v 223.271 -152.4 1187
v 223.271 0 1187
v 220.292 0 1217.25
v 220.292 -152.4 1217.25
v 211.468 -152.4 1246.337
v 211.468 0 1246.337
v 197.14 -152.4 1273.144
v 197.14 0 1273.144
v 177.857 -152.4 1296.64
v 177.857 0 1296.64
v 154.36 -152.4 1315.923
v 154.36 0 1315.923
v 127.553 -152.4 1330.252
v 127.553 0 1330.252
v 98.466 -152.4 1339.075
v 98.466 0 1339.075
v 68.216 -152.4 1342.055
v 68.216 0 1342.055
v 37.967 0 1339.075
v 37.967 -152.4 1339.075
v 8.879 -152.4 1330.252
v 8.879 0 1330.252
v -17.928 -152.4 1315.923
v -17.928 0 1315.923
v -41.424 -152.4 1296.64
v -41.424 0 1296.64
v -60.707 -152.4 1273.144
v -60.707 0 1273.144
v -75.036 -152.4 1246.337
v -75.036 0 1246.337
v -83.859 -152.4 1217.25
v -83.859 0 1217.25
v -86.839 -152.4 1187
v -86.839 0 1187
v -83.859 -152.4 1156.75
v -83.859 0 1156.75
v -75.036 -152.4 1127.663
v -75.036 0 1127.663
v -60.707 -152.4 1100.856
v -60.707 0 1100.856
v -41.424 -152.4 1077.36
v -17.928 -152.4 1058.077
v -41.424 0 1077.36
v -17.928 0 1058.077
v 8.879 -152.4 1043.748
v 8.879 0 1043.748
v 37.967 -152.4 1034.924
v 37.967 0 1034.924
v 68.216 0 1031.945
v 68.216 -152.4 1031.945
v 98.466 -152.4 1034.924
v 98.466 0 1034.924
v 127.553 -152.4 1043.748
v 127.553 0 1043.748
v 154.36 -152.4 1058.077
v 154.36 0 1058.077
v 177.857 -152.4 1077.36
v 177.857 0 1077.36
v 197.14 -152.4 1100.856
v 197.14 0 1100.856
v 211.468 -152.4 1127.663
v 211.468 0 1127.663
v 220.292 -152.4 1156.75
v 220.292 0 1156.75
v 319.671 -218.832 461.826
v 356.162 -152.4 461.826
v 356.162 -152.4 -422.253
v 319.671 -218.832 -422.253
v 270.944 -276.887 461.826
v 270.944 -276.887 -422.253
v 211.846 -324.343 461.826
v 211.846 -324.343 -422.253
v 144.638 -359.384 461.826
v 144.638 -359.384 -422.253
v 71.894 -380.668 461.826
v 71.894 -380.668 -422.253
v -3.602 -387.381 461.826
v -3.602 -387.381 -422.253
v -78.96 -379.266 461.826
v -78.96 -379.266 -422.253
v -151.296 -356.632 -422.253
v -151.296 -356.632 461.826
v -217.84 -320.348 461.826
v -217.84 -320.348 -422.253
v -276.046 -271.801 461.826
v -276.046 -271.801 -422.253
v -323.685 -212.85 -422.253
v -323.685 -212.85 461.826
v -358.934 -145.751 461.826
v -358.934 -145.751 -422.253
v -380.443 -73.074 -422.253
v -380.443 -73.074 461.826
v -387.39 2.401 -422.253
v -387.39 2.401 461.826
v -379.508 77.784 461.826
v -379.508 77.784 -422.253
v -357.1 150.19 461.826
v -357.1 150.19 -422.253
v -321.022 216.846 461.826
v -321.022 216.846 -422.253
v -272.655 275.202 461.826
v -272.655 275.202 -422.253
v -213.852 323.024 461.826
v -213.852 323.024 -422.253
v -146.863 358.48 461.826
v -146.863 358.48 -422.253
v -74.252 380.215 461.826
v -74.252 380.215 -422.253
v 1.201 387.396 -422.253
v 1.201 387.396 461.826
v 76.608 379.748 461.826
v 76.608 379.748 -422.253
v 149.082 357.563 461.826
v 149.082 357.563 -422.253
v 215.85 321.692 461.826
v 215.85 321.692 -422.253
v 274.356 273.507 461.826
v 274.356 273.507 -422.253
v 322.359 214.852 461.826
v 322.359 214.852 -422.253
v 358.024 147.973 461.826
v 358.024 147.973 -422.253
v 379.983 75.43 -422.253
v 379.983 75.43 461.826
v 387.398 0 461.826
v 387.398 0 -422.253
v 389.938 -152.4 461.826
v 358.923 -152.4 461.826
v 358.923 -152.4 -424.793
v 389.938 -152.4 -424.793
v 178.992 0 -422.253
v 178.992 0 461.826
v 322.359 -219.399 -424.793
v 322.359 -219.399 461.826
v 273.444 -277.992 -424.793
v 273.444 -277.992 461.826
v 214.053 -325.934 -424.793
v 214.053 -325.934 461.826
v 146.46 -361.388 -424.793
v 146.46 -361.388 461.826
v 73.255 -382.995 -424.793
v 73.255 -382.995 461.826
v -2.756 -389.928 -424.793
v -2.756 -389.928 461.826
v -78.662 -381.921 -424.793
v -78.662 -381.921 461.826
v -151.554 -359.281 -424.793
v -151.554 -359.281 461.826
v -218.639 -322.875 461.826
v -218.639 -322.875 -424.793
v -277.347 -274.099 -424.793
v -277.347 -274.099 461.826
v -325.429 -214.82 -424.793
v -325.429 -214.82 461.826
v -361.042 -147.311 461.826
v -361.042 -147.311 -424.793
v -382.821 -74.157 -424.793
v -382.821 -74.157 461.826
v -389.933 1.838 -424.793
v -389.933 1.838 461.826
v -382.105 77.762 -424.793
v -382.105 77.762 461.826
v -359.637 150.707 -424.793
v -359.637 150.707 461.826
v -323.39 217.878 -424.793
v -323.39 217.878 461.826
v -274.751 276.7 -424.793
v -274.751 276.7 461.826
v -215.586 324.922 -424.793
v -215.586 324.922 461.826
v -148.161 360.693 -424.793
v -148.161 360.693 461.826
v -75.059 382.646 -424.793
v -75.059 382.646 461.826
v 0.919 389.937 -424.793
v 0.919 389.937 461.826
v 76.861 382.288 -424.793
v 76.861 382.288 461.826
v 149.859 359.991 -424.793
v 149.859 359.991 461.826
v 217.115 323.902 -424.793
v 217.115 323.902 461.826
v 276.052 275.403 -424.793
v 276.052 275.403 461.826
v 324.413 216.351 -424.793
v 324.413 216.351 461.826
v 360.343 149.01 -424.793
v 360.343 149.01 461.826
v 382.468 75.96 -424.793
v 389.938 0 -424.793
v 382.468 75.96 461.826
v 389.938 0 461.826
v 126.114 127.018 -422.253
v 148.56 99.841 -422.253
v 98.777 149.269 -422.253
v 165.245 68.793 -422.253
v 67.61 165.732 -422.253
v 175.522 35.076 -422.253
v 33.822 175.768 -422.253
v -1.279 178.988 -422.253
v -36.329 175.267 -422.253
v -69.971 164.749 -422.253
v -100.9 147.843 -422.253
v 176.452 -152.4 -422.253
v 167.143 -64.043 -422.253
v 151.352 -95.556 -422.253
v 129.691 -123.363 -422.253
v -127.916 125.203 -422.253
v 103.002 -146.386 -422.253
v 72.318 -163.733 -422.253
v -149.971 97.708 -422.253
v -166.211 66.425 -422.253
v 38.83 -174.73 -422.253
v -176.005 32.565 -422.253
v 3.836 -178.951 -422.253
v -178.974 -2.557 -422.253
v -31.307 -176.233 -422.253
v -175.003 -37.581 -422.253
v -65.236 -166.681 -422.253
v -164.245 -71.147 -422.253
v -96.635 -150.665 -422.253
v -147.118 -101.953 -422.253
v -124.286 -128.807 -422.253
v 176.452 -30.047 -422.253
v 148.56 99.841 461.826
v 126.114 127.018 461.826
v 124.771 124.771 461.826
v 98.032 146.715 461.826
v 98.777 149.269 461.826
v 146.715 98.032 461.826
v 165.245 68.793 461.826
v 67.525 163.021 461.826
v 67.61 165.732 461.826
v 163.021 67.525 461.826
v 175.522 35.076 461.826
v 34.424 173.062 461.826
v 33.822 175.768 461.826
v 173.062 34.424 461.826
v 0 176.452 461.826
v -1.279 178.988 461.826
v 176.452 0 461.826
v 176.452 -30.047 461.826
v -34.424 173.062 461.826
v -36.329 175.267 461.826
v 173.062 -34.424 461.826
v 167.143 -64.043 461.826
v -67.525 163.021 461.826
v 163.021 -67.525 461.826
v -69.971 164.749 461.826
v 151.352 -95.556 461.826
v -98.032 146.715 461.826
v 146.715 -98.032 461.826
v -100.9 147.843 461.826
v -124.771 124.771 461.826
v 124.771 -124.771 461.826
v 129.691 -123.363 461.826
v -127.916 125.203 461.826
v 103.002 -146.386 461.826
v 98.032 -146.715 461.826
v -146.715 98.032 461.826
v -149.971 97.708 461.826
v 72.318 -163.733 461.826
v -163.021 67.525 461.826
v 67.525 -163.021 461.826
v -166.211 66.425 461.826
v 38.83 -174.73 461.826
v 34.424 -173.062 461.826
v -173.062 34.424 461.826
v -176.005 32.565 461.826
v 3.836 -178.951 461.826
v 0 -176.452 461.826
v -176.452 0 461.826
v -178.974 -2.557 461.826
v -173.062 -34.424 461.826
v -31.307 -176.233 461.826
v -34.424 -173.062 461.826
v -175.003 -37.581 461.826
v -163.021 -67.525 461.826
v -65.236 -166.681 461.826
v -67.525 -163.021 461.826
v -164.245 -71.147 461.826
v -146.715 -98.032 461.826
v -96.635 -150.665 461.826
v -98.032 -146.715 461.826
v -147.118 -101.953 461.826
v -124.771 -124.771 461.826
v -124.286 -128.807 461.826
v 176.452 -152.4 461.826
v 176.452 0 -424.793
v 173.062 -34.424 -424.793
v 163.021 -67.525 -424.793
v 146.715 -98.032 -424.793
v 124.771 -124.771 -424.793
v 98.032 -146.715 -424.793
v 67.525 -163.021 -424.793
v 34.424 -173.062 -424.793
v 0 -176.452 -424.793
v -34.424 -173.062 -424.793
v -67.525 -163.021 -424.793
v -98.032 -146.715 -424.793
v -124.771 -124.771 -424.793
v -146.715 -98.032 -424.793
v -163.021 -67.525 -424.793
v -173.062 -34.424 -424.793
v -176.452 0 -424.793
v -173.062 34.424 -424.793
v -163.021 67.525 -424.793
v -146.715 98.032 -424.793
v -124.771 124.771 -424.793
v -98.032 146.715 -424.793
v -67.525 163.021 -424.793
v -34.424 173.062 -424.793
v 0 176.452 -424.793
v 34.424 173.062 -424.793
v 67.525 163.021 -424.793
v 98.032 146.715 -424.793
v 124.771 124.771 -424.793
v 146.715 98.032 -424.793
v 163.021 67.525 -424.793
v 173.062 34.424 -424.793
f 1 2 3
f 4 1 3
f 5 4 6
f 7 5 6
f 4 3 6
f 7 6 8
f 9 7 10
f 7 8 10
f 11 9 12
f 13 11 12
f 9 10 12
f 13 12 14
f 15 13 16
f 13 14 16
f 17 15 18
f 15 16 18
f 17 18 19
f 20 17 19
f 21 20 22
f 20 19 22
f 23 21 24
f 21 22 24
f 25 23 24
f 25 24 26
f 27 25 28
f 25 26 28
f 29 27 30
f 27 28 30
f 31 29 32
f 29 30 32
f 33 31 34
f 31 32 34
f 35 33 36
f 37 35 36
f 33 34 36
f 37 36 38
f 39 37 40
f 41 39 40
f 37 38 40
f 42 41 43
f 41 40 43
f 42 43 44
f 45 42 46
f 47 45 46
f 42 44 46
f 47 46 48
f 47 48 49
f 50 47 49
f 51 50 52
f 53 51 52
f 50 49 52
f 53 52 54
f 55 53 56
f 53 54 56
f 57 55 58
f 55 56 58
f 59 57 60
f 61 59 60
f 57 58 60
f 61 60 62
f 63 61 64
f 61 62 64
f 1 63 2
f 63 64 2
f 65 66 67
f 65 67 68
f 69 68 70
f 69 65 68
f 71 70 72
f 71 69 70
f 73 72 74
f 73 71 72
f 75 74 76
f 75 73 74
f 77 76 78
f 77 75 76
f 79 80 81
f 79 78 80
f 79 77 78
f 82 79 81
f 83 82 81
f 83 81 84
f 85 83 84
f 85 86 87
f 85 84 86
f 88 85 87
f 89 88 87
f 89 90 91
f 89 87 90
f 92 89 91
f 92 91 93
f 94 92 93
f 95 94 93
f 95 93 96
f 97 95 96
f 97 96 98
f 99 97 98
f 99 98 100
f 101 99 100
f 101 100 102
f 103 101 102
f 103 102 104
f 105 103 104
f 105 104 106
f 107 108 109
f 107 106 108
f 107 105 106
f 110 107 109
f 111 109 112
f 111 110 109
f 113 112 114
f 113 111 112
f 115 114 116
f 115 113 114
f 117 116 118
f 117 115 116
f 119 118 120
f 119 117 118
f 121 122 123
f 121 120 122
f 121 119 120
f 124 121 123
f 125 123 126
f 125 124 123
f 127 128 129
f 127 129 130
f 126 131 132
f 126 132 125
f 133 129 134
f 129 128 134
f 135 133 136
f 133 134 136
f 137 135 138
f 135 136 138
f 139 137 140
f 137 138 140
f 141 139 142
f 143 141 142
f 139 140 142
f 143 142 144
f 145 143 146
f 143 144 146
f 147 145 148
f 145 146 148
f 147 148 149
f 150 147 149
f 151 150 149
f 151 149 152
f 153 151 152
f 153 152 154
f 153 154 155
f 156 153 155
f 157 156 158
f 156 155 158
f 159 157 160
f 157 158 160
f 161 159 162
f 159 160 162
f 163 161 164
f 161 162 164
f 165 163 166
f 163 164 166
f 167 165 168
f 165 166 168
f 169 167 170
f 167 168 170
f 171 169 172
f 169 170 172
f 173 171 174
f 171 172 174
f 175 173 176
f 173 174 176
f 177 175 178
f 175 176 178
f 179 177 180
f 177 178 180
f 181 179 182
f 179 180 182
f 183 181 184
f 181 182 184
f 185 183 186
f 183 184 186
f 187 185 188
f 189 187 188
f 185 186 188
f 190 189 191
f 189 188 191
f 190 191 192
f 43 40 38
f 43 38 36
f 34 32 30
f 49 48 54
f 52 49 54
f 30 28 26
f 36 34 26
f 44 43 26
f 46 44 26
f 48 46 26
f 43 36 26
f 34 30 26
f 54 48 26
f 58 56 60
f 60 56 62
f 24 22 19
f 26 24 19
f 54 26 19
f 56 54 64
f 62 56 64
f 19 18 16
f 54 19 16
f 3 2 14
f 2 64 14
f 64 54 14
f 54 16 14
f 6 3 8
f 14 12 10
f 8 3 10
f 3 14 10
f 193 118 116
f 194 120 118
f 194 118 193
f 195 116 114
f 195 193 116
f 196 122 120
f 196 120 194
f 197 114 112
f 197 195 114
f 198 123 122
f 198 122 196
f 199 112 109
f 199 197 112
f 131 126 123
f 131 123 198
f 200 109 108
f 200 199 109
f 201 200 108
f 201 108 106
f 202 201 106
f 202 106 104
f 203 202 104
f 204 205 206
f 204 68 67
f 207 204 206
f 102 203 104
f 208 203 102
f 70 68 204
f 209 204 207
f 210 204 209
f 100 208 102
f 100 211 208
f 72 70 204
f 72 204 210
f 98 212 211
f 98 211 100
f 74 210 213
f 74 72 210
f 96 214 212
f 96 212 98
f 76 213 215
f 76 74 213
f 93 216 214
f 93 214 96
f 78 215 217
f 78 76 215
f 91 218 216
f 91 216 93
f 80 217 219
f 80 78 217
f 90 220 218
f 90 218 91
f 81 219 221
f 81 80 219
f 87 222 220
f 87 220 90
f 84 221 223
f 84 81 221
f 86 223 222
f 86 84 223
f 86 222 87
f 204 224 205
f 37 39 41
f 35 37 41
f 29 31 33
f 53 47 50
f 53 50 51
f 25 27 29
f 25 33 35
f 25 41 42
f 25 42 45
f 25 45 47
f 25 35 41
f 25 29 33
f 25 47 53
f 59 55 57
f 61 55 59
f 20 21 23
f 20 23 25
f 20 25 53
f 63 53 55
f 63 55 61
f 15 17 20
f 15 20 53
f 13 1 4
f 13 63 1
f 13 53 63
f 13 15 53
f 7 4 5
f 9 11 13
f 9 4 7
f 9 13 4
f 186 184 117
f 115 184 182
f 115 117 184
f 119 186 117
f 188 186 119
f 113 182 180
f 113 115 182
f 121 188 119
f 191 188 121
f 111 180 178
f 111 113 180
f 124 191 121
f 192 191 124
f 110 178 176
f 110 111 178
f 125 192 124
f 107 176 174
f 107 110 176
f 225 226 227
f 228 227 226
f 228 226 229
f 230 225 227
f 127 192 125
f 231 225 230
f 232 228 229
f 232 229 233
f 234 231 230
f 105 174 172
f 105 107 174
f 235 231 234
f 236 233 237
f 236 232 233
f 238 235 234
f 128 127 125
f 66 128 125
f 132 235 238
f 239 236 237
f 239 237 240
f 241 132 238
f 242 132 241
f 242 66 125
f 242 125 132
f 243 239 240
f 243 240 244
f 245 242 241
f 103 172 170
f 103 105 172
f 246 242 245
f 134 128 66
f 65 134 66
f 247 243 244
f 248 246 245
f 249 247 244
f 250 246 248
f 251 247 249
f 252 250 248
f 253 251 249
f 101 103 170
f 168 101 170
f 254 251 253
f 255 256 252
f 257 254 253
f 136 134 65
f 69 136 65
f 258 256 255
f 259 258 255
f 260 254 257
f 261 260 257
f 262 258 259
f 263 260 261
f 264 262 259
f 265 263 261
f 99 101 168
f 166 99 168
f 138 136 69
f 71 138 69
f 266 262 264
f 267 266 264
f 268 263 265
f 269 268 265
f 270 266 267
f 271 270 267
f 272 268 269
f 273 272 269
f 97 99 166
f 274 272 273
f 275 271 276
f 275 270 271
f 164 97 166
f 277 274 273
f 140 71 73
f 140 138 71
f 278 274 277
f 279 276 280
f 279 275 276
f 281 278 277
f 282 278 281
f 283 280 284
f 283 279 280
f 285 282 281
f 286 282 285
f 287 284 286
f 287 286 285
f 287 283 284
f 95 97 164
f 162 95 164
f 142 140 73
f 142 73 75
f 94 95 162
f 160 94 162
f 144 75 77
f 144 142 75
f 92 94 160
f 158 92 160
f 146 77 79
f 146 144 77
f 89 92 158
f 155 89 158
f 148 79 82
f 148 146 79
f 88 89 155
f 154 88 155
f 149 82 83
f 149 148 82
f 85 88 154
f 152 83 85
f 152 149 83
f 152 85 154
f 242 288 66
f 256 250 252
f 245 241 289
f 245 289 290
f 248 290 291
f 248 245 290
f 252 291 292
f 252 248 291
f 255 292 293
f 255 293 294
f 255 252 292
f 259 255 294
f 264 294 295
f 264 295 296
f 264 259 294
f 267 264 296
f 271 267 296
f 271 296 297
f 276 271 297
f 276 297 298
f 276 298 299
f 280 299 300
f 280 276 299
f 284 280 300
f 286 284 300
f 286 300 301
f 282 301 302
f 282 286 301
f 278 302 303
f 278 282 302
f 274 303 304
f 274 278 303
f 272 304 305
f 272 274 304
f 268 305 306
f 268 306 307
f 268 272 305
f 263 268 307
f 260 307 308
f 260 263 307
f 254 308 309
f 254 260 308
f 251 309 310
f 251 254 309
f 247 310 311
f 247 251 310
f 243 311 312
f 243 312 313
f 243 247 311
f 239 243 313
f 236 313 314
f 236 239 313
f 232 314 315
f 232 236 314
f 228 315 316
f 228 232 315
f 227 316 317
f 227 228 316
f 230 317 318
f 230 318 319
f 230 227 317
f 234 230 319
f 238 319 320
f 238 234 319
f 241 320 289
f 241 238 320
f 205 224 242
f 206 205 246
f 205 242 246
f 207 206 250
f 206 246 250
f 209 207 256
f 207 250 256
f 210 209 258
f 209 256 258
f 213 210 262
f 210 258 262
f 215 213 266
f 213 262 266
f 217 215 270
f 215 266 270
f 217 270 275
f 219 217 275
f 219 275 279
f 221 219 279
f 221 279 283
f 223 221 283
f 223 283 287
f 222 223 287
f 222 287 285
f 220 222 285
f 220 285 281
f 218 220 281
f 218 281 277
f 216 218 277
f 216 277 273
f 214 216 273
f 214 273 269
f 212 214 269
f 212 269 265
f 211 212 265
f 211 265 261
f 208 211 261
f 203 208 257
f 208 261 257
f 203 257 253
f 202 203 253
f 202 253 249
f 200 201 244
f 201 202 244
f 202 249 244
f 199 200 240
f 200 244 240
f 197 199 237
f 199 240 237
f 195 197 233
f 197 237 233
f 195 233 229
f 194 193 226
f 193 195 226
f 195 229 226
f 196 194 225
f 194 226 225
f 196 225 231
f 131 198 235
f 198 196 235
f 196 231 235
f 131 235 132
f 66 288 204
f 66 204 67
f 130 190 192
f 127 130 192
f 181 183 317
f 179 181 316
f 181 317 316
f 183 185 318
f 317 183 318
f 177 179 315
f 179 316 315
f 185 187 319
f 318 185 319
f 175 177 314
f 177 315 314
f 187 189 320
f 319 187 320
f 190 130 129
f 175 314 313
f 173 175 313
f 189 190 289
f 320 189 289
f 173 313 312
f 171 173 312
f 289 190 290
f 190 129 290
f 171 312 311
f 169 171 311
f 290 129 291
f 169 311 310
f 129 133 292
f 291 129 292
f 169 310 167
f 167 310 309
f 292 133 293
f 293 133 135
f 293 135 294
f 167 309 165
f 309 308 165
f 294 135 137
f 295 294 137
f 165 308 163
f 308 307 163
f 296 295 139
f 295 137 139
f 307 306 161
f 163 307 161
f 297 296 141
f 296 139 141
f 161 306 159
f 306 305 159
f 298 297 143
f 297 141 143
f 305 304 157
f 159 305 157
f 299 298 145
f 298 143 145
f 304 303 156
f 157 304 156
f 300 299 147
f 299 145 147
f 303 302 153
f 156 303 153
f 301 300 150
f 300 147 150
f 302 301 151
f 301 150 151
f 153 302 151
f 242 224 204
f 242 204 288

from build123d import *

# Parameters (mm, degrees)
F0_W     = 213.485479
F0_H     = 886.618256
F2_T     = -2.54
F0_R     = 155.054815
F3_DEPTH = 152.4


with BuildPart() as f1:
    # F0 (on Front) → F1 (revolve)
    with BuildSketch(Plane.XZ):
        with Locations((283.195019, 18.5166)):
            Rectangle(F0_W, F0_H)
    revolve(axis=Axis((0, 0, -4.356861), (0, 0, -1)))

    # F2
    f2_openings = [f1.faces().sort_by_distance(p)[0] for p in [
        (-378.908653, 0, 461.825728),
    ]]
    offset(amount=F2_T, openings=f2_openings)

    # F0 (on Front) → F3 (join)
    with BuildSketch(Plane.XZ):
        with Locations((283.195019, 18.5166)):
            Rectangle(F0_W, F0_H)
        with Locations((68.216197, 1186.999917)):
            Circle(F0_R)
    extrude(amount=F3_DEPTH)


solid = f1.part
